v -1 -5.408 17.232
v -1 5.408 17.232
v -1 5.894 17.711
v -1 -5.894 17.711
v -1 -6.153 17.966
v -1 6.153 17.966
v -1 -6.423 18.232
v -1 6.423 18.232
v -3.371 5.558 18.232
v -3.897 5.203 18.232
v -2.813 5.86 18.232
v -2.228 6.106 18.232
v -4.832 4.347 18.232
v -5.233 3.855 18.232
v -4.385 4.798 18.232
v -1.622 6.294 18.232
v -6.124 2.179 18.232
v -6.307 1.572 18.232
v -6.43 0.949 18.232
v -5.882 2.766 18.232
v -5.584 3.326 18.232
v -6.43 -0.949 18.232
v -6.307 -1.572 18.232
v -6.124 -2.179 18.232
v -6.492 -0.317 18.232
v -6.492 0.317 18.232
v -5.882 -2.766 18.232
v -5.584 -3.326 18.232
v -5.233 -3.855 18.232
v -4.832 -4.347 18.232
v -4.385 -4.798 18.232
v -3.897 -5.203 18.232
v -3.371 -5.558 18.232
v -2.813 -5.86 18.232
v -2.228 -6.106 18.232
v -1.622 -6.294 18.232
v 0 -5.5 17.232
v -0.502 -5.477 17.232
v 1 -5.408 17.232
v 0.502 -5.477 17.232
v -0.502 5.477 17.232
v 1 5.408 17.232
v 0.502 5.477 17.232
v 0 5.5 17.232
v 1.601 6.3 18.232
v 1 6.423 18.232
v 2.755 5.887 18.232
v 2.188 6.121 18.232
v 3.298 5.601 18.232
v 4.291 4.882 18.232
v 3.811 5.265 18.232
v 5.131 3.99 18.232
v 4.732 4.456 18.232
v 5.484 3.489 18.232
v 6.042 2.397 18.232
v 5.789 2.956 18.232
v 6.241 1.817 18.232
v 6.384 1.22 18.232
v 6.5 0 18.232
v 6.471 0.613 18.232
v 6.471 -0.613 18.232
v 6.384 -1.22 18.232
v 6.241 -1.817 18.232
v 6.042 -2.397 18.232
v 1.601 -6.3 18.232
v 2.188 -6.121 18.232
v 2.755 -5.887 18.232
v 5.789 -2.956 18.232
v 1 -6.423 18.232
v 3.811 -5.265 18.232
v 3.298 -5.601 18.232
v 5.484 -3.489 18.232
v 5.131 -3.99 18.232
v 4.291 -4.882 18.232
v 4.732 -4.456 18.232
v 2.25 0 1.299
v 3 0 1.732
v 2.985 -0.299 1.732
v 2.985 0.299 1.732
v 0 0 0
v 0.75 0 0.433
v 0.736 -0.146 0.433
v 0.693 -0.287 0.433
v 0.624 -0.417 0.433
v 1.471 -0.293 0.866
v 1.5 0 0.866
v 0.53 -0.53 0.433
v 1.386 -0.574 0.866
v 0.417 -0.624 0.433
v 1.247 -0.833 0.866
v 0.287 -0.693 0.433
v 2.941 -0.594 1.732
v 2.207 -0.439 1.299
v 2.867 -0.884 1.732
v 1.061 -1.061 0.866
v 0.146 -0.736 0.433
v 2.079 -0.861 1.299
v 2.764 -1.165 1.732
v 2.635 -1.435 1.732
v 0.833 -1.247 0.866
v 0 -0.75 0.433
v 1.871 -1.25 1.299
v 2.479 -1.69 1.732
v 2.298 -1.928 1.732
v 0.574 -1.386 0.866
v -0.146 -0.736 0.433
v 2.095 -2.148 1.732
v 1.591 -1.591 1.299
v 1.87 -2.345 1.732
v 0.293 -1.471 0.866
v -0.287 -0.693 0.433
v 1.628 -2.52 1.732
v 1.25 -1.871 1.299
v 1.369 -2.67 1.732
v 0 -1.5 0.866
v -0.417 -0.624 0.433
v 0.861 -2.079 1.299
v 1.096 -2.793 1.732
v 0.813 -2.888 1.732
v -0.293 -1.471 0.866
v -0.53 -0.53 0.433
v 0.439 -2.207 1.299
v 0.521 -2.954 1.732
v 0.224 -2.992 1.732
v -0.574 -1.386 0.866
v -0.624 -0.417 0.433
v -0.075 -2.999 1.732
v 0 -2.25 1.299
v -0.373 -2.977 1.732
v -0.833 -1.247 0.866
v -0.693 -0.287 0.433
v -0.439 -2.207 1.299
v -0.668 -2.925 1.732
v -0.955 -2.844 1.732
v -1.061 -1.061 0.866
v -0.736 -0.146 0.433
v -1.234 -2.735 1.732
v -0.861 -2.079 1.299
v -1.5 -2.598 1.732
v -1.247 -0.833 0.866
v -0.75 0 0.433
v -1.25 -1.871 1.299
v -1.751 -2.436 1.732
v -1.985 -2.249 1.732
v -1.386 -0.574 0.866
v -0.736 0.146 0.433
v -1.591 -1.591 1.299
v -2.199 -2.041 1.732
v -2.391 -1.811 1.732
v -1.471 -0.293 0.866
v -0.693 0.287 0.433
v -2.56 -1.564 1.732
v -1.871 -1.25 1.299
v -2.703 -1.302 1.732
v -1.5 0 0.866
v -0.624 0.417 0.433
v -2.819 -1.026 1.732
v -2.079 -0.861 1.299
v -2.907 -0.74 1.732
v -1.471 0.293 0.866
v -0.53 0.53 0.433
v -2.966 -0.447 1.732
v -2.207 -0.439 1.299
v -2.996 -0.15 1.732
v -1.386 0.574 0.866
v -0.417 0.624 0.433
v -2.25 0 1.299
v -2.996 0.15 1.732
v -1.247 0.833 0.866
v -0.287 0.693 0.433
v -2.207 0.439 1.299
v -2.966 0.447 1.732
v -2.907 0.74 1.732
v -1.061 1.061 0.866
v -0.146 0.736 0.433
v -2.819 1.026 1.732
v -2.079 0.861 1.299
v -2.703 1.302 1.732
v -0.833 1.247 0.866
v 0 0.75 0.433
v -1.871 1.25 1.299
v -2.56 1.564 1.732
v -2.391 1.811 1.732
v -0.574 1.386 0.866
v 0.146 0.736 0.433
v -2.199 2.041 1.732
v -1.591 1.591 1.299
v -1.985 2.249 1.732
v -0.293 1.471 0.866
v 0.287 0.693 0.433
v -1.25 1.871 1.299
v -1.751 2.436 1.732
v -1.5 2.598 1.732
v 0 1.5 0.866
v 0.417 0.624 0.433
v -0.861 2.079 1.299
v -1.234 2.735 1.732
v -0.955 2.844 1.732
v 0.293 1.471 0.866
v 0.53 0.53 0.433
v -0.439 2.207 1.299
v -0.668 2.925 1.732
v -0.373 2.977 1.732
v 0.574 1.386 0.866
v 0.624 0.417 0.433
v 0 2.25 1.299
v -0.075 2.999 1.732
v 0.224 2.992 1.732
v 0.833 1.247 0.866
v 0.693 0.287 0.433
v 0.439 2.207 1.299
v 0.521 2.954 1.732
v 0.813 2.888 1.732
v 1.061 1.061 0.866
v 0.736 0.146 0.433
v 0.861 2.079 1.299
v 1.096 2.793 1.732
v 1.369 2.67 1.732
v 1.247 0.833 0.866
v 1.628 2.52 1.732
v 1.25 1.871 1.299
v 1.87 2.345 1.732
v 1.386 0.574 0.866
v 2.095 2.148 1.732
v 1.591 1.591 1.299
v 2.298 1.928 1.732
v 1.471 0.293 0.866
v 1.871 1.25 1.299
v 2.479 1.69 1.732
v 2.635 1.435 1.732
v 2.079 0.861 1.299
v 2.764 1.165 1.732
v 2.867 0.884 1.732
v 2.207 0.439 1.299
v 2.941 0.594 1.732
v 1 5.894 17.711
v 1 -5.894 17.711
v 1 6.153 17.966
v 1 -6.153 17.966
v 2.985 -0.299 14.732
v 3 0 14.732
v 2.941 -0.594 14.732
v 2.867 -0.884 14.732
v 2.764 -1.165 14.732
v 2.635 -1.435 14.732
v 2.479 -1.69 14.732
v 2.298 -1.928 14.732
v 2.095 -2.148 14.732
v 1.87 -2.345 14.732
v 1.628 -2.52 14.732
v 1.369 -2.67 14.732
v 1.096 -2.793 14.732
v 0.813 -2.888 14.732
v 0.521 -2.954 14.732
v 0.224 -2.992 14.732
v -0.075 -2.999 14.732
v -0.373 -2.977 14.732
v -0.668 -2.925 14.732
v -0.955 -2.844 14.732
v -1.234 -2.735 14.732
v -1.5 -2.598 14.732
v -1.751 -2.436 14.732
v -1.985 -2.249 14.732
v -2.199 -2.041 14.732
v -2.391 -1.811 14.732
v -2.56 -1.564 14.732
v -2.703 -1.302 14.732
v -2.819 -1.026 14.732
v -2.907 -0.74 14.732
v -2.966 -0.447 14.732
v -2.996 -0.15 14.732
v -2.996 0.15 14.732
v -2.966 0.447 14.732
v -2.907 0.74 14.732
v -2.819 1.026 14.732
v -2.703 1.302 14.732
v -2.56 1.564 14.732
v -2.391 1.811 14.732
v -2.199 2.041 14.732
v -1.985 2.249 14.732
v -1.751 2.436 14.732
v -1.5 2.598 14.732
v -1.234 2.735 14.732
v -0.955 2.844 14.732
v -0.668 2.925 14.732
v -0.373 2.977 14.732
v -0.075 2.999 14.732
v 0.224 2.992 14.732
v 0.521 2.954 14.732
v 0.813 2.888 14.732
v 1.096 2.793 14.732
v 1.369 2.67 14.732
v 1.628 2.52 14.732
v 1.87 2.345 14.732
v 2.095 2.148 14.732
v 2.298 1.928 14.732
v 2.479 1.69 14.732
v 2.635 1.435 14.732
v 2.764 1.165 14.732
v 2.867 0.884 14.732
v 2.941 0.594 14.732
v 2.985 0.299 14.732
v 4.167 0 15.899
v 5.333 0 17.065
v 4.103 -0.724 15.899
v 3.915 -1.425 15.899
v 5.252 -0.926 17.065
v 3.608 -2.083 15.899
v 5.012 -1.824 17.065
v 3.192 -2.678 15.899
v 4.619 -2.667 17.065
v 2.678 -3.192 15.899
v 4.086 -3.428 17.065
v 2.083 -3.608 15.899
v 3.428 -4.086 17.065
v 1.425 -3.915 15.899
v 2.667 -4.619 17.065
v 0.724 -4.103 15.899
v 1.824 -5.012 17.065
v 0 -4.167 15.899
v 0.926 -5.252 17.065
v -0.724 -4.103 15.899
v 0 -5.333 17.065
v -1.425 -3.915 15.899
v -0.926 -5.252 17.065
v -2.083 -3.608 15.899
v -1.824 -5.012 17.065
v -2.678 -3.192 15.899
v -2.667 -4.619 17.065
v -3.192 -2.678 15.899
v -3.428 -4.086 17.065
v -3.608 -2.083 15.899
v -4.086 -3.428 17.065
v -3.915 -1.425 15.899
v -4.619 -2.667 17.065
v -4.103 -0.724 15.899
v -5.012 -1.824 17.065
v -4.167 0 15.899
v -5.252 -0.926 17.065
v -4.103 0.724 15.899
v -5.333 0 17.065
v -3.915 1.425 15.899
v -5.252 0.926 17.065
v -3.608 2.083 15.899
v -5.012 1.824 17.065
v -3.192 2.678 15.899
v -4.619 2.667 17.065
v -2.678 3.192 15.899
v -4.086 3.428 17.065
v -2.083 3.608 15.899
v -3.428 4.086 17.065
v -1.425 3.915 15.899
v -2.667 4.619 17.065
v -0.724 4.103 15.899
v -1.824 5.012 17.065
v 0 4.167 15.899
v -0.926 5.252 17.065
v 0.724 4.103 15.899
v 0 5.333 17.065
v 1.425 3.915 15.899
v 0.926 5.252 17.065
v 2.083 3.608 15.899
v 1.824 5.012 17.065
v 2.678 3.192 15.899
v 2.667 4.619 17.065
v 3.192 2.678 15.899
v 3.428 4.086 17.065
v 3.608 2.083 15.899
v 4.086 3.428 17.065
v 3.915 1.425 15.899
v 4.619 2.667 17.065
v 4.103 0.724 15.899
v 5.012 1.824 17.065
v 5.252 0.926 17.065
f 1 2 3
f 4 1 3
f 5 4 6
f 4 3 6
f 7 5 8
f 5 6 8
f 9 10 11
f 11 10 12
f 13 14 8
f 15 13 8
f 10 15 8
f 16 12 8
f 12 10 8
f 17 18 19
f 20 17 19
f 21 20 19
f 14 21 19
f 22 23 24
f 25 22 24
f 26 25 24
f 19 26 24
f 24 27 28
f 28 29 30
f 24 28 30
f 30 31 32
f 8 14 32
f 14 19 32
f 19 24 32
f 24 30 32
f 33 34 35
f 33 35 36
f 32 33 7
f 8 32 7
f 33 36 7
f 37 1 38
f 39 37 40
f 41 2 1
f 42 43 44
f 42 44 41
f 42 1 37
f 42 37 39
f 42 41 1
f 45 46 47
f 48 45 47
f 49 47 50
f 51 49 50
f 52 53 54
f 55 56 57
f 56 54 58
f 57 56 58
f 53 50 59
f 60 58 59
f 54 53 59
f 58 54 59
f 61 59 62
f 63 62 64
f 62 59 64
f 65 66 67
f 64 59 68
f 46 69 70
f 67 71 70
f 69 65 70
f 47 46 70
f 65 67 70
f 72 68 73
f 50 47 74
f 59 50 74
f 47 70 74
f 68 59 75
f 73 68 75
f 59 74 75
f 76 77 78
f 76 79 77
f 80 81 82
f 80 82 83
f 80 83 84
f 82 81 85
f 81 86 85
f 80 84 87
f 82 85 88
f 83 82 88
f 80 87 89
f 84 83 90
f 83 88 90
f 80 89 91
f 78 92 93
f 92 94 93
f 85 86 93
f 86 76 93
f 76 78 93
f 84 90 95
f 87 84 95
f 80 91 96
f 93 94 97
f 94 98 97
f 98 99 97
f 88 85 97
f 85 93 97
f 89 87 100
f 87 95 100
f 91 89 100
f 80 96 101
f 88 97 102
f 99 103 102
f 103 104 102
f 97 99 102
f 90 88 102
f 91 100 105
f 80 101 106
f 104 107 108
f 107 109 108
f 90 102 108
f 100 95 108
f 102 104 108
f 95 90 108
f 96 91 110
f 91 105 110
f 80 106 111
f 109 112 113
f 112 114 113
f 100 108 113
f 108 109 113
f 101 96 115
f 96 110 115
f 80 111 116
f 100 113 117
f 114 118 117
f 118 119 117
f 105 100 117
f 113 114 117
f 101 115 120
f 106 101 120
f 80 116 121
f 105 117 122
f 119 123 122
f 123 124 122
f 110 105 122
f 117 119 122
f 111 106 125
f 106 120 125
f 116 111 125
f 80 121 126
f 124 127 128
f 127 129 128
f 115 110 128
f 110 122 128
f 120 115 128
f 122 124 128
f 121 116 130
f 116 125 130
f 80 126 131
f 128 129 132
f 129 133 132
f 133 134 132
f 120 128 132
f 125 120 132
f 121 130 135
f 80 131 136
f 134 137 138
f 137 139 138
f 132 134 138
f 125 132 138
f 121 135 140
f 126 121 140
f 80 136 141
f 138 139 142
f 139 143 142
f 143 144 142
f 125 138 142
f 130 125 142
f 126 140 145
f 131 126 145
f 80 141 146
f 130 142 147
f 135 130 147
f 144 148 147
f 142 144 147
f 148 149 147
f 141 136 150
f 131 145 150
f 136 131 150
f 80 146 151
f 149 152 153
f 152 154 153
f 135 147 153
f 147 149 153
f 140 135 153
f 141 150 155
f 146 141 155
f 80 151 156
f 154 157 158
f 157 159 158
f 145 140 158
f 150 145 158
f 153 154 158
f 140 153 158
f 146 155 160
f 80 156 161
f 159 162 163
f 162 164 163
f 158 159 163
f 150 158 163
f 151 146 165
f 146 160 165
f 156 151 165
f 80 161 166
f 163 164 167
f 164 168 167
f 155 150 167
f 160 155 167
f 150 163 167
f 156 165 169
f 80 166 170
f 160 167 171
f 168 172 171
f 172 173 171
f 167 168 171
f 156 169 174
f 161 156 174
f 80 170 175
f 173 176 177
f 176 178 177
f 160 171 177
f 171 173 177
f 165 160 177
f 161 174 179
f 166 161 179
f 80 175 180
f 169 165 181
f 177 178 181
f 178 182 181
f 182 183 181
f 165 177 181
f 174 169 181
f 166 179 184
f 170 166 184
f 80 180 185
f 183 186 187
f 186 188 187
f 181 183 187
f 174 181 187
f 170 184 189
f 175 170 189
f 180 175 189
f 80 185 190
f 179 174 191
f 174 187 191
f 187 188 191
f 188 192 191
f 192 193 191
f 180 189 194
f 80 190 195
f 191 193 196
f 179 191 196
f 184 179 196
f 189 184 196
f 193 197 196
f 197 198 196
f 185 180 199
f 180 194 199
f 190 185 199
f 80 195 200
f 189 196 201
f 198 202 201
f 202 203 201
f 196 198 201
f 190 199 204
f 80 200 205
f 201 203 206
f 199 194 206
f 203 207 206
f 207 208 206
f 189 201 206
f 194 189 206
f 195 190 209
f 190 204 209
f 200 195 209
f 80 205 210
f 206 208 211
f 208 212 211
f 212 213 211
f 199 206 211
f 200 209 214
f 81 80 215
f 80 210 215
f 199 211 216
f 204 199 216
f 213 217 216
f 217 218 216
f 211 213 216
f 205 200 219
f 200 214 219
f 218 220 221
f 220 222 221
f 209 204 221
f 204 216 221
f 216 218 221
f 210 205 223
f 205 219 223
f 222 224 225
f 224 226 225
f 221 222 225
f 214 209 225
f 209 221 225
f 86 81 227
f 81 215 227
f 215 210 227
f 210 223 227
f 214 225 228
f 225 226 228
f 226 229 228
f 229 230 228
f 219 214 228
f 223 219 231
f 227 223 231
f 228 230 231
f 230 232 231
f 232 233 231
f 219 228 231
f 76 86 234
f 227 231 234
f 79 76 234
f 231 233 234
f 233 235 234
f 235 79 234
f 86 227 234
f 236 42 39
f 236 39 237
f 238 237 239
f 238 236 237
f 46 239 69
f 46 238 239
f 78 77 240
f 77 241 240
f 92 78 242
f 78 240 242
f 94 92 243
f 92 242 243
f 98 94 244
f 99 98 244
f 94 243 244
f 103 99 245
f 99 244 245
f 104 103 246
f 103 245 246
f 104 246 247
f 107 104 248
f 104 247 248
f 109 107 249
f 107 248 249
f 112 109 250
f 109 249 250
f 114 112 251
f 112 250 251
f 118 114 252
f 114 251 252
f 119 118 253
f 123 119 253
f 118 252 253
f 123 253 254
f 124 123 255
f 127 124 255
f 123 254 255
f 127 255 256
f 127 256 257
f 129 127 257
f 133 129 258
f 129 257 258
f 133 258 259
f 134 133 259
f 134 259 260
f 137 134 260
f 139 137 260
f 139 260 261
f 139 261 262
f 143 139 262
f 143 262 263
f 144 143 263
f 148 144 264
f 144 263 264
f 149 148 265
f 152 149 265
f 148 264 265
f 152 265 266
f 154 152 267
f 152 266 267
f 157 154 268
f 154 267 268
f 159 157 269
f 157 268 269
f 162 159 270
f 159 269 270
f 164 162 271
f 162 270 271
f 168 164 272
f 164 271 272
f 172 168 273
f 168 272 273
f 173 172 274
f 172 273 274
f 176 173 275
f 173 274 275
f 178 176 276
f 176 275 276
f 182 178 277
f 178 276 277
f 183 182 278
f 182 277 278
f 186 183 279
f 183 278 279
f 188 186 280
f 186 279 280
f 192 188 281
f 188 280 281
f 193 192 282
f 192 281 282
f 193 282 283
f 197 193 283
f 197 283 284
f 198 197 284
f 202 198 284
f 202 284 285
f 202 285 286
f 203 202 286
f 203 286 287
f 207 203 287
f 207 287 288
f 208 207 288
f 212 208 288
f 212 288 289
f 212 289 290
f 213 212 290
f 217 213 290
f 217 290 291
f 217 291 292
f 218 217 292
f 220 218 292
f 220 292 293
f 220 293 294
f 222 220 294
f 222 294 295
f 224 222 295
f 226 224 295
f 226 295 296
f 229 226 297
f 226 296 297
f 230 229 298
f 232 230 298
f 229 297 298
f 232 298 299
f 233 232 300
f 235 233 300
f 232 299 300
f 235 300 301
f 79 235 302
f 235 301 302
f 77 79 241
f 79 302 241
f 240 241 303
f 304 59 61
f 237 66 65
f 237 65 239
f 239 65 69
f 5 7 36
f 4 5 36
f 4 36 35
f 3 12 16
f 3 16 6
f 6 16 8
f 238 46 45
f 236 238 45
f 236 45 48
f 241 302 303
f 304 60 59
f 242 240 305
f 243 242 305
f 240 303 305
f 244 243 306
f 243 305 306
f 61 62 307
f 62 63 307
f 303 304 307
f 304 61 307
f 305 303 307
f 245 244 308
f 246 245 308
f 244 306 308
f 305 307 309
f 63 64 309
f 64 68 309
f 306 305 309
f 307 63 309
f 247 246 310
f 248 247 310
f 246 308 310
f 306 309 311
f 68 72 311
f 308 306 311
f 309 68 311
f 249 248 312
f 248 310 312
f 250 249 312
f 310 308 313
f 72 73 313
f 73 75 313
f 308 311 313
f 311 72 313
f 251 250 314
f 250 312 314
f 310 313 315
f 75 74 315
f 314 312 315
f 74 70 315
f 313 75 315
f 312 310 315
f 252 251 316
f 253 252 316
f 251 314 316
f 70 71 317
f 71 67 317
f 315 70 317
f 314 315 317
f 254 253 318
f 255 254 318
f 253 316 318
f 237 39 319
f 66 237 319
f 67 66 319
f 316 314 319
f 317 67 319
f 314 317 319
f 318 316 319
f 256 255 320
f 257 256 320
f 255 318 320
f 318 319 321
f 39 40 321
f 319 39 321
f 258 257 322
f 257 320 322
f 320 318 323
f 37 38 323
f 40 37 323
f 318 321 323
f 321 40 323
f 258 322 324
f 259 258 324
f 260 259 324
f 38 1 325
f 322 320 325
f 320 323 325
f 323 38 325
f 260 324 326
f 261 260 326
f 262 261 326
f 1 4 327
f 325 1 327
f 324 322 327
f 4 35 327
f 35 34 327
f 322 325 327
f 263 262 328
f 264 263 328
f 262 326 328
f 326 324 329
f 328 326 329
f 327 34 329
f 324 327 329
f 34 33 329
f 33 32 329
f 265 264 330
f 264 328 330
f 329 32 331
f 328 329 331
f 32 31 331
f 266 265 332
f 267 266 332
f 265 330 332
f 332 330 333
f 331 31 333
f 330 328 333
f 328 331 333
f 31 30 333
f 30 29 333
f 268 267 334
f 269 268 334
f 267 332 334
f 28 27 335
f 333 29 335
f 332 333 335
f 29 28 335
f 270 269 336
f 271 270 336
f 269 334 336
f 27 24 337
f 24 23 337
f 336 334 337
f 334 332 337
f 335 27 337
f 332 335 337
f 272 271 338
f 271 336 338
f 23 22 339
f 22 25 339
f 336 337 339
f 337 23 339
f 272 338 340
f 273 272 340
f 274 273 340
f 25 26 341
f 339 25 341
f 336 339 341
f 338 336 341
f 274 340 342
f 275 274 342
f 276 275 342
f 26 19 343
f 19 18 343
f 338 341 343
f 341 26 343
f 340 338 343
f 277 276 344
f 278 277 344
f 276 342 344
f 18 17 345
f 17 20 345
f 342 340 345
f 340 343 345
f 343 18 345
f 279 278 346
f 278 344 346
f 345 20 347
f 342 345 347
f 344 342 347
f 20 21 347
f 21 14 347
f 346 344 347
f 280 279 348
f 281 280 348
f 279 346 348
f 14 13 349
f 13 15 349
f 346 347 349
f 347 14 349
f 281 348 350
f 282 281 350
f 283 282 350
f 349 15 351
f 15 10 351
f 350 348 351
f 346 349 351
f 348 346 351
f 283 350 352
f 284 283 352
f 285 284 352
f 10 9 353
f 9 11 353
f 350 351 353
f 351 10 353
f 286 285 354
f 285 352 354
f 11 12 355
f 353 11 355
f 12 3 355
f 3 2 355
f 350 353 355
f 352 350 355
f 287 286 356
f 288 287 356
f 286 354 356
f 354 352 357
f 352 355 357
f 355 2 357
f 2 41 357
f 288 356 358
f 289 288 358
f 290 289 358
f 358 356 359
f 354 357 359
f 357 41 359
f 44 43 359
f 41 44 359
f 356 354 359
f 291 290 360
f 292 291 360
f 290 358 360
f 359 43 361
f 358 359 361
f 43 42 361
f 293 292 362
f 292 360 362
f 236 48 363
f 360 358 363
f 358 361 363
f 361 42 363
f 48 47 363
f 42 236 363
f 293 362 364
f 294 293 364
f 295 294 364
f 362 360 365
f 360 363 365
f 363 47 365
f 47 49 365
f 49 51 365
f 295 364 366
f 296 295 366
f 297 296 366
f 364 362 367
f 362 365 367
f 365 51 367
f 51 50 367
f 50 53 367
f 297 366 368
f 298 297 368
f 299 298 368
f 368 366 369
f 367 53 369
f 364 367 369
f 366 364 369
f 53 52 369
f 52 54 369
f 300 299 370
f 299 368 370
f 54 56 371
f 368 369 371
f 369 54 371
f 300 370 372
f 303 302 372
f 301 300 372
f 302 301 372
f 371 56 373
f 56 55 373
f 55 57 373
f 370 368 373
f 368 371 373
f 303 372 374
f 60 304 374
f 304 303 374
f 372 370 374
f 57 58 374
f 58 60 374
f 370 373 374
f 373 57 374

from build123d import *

# Parameters (mm, degrees)
F2_W          = 2
F2_H          = 4.9041104602
F3_DEPTH      = 6.501
F3_DEPTH_BACK = 6.501


with BuildPart() as f1:
    # F0 (on Front) → F1 (revolve)
    with BuildSketch(Plane.XZ):
        Polygon((0, 18.2320508076), (0, 0), (3, 1.7320508076), (3, 14.7320508076), (6.5, 18.2320508076), align=None)
    revolve(axis=Axis((0, 0, 9.1160254038), (0, 0, -1)))

    # F2 (on Front) → F3 (cut, two sides)
    with BuildSketch(Plane.XZ) as f3_sk:
        with Locations((0, 19.6841060377)):
            Rectangle(F2_W, F2_H)
    extrude(amount=-F3_DEPTH, mode=Mode.SUBTRACT)
    extrude(f3_sk.sketch, amount=F3_DEPTH_BACK, mode=Mode.SUBTRACT)


solid = f1.part
